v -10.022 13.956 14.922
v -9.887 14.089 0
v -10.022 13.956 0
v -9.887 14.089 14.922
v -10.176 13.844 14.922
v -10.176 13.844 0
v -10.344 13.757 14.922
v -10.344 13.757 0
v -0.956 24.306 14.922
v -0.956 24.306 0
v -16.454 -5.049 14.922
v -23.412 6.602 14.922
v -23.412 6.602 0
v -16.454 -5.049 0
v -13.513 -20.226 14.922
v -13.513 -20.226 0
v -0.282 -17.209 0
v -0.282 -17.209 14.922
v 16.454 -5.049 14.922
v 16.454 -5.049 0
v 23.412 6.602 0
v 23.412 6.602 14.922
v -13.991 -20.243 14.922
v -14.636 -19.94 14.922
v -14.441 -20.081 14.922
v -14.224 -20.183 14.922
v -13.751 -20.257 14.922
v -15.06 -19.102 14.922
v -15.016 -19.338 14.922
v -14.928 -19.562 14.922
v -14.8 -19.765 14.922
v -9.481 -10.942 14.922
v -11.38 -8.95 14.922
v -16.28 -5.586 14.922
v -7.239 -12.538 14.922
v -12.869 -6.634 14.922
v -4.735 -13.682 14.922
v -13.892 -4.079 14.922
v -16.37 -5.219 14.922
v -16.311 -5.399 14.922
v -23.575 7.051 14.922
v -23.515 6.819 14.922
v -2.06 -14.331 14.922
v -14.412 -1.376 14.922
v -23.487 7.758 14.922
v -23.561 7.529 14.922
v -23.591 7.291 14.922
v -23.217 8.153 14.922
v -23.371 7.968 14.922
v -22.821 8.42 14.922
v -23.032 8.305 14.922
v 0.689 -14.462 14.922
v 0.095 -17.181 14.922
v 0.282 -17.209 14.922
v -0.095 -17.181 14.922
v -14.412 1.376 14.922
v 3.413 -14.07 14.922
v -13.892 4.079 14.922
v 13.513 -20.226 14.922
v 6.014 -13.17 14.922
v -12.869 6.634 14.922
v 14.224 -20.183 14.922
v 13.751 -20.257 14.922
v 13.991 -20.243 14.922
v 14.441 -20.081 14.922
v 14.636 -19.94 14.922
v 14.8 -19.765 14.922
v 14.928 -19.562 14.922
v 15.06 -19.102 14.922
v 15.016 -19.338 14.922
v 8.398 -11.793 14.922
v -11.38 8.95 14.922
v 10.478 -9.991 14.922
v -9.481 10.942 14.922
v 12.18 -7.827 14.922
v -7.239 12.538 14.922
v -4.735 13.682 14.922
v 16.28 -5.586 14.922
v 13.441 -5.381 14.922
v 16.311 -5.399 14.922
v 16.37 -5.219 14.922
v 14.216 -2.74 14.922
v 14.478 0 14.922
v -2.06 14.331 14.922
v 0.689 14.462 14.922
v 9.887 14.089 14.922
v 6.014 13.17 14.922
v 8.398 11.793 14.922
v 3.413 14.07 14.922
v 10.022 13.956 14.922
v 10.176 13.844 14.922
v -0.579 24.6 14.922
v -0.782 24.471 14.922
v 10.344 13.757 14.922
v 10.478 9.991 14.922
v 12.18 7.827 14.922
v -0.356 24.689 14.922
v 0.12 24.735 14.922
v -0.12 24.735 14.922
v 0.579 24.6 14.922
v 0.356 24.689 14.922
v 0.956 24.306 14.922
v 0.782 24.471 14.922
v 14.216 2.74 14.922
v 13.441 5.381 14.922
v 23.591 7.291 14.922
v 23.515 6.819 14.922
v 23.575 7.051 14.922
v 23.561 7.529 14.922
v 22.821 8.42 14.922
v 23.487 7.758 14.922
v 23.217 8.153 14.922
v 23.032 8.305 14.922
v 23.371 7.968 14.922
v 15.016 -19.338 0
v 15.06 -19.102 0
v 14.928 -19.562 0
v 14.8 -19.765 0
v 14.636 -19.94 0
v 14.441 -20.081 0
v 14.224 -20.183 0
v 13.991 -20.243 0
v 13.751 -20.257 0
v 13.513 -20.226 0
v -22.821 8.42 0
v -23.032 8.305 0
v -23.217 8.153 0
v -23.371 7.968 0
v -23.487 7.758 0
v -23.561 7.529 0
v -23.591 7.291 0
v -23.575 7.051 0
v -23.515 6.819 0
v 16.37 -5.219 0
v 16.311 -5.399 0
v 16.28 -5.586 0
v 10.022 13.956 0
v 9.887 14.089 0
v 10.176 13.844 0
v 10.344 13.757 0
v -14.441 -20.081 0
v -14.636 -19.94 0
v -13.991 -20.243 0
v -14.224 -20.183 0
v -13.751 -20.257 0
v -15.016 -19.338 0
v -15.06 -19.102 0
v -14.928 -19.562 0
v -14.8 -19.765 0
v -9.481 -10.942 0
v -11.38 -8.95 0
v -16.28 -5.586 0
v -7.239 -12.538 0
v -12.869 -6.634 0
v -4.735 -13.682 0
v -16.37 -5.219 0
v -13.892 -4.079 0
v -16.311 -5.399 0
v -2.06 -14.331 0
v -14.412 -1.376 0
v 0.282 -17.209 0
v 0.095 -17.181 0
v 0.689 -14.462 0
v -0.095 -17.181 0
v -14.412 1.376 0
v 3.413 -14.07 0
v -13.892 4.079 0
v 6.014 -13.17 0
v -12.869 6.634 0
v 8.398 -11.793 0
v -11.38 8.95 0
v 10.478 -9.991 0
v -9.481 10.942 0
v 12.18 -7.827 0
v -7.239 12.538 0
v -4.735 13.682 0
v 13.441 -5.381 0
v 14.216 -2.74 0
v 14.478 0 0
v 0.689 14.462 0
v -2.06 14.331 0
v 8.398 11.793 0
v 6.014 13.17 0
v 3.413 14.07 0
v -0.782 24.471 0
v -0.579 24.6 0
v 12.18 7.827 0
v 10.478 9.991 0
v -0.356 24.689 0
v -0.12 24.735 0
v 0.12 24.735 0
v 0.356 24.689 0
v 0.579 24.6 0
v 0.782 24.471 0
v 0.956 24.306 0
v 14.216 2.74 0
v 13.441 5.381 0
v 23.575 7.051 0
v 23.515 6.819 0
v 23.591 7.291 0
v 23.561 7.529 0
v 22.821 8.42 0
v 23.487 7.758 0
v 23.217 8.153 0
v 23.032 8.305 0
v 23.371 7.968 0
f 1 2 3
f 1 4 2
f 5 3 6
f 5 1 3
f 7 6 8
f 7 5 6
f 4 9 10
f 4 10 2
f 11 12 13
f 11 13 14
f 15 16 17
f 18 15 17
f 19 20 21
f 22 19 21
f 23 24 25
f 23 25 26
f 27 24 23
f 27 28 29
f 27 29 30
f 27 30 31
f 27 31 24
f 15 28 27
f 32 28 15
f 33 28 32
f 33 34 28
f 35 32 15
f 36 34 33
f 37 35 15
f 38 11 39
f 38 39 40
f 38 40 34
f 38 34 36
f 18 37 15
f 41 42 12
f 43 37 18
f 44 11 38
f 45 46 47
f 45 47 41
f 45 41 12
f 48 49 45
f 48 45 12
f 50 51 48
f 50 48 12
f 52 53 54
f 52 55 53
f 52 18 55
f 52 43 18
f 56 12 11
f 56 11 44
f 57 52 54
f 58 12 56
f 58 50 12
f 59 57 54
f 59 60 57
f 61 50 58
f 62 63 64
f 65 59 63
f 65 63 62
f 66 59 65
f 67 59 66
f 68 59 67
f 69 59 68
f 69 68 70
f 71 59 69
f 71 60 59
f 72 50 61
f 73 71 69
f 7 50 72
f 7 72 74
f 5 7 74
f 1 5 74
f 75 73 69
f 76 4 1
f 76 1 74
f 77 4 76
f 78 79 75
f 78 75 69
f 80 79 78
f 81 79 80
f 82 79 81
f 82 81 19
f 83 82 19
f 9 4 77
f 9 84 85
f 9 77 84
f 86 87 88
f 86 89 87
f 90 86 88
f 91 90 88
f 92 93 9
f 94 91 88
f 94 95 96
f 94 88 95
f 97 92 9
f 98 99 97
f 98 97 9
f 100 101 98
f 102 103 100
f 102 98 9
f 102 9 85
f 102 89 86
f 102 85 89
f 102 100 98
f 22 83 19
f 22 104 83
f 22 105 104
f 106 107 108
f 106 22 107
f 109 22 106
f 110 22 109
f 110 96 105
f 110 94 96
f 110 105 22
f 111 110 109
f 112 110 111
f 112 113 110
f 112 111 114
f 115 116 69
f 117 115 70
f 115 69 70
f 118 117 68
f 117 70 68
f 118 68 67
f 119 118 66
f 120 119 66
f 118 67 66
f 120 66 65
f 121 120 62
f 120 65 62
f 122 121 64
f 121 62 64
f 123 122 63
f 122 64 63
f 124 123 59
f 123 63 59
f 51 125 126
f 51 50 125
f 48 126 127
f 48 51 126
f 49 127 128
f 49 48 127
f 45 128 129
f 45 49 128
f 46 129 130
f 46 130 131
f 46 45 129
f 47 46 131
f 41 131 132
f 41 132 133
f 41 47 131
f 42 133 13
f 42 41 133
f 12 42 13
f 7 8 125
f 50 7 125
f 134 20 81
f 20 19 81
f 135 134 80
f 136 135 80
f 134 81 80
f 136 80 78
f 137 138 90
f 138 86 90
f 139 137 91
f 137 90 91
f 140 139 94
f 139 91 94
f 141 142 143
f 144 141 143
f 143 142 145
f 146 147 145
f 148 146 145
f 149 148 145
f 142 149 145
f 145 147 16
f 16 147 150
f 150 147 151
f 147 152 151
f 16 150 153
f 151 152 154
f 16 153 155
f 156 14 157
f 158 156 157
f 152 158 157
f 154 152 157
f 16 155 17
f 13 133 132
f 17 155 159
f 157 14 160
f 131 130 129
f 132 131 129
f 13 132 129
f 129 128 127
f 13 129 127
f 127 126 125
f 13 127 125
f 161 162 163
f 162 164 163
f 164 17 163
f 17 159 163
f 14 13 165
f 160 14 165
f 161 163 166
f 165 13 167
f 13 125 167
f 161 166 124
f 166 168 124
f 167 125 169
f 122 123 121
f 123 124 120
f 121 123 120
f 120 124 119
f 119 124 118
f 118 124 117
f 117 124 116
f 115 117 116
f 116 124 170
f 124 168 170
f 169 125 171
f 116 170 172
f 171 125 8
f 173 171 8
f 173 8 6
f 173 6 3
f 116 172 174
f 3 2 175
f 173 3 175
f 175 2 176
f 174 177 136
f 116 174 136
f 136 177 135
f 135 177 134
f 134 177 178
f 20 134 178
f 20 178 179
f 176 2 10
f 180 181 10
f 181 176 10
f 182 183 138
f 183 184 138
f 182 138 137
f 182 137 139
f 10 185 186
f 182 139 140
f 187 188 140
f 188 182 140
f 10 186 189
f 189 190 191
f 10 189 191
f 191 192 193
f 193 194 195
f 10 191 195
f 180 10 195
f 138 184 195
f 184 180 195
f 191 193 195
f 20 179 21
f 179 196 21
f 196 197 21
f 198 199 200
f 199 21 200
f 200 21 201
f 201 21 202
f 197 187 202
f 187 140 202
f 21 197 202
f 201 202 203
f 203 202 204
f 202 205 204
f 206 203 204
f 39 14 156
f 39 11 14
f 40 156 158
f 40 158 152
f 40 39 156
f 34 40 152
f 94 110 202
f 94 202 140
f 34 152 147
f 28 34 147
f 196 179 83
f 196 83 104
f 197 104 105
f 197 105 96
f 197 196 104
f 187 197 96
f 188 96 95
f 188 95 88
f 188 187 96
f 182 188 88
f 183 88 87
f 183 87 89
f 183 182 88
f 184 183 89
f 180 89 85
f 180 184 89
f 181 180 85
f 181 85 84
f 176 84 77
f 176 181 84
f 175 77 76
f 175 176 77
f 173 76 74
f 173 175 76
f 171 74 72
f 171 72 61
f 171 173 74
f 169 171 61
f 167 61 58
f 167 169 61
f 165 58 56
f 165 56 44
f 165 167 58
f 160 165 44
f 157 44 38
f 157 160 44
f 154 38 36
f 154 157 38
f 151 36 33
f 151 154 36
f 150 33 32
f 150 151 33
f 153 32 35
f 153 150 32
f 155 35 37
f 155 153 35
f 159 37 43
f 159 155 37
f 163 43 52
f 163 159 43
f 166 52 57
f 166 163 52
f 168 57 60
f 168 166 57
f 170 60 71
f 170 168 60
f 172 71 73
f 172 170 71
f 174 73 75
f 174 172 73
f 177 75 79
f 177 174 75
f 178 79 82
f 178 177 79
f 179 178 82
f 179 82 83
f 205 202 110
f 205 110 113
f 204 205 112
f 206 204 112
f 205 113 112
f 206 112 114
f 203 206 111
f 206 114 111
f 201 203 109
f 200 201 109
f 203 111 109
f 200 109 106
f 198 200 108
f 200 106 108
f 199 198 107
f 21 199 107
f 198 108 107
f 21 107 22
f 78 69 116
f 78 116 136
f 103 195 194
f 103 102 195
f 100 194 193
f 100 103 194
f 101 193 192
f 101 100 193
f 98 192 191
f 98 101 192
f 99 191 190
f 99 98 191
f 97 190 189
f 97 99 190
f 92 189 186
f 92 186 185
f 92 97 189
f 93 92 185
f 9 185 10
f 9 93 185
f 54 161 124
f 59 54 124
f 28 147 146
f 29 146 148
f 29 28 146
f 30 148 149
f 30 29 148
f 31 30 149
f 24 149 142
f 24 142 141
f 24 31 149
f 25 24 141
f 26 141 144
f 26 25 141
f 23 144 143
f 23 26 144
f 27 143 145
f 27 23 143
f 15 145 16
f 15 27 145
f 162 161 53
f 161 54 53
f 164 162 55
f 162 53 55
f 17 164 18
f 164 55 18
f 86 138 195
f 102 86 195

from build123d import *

# Parameters (mm, degrees)
F0_R     = 14.478
F1_DEPTH = 14.9225
F2_R     = 1.27


with BuildPart() as f1:
    # F0 (on Top) → F1 (new body)
    with BuildSketch(Plane.XY):
        Polygon((10.077578, 13.870596), (0, 25.4), (-10.077578, 13.870596), (-24.156836, 7.849032), (-16.305864, -5.298096), (-14.929745, -20.549032), (0, -17.145), (14.929745, -20.549032), (16.305864, -5.298096), (24.156836, 7.849032), align=None)
        Circle(F0_R, mode=Mode.SUBTRACT)
    extrude(amount=F1_DEPTH)

    # F2
    f2_edges = [f1.edges().sort_by_distance(p)[0] for p in [
        (-14.929745, -20.549032, 7.46125),
        (14.929745, -20.549032, 7.46125),
        (-24.156836, 7.849032, 7.46125),
        (24.156836, 7.849032, 7.46125),
        (0, 25.4, 7.46125),
        (-16.305864, -5.298096, 7.46125),
        (0, -17.145, 7.46125),
        (16.305864, -5.298096, 7.46125),
        (10.077578, 13.870596, 7.46125),
        (-10.077578, 13.870596, 7.46125),
    ]]
    fillet(f2_edges, radius=F2_R)


solid = f1.part
